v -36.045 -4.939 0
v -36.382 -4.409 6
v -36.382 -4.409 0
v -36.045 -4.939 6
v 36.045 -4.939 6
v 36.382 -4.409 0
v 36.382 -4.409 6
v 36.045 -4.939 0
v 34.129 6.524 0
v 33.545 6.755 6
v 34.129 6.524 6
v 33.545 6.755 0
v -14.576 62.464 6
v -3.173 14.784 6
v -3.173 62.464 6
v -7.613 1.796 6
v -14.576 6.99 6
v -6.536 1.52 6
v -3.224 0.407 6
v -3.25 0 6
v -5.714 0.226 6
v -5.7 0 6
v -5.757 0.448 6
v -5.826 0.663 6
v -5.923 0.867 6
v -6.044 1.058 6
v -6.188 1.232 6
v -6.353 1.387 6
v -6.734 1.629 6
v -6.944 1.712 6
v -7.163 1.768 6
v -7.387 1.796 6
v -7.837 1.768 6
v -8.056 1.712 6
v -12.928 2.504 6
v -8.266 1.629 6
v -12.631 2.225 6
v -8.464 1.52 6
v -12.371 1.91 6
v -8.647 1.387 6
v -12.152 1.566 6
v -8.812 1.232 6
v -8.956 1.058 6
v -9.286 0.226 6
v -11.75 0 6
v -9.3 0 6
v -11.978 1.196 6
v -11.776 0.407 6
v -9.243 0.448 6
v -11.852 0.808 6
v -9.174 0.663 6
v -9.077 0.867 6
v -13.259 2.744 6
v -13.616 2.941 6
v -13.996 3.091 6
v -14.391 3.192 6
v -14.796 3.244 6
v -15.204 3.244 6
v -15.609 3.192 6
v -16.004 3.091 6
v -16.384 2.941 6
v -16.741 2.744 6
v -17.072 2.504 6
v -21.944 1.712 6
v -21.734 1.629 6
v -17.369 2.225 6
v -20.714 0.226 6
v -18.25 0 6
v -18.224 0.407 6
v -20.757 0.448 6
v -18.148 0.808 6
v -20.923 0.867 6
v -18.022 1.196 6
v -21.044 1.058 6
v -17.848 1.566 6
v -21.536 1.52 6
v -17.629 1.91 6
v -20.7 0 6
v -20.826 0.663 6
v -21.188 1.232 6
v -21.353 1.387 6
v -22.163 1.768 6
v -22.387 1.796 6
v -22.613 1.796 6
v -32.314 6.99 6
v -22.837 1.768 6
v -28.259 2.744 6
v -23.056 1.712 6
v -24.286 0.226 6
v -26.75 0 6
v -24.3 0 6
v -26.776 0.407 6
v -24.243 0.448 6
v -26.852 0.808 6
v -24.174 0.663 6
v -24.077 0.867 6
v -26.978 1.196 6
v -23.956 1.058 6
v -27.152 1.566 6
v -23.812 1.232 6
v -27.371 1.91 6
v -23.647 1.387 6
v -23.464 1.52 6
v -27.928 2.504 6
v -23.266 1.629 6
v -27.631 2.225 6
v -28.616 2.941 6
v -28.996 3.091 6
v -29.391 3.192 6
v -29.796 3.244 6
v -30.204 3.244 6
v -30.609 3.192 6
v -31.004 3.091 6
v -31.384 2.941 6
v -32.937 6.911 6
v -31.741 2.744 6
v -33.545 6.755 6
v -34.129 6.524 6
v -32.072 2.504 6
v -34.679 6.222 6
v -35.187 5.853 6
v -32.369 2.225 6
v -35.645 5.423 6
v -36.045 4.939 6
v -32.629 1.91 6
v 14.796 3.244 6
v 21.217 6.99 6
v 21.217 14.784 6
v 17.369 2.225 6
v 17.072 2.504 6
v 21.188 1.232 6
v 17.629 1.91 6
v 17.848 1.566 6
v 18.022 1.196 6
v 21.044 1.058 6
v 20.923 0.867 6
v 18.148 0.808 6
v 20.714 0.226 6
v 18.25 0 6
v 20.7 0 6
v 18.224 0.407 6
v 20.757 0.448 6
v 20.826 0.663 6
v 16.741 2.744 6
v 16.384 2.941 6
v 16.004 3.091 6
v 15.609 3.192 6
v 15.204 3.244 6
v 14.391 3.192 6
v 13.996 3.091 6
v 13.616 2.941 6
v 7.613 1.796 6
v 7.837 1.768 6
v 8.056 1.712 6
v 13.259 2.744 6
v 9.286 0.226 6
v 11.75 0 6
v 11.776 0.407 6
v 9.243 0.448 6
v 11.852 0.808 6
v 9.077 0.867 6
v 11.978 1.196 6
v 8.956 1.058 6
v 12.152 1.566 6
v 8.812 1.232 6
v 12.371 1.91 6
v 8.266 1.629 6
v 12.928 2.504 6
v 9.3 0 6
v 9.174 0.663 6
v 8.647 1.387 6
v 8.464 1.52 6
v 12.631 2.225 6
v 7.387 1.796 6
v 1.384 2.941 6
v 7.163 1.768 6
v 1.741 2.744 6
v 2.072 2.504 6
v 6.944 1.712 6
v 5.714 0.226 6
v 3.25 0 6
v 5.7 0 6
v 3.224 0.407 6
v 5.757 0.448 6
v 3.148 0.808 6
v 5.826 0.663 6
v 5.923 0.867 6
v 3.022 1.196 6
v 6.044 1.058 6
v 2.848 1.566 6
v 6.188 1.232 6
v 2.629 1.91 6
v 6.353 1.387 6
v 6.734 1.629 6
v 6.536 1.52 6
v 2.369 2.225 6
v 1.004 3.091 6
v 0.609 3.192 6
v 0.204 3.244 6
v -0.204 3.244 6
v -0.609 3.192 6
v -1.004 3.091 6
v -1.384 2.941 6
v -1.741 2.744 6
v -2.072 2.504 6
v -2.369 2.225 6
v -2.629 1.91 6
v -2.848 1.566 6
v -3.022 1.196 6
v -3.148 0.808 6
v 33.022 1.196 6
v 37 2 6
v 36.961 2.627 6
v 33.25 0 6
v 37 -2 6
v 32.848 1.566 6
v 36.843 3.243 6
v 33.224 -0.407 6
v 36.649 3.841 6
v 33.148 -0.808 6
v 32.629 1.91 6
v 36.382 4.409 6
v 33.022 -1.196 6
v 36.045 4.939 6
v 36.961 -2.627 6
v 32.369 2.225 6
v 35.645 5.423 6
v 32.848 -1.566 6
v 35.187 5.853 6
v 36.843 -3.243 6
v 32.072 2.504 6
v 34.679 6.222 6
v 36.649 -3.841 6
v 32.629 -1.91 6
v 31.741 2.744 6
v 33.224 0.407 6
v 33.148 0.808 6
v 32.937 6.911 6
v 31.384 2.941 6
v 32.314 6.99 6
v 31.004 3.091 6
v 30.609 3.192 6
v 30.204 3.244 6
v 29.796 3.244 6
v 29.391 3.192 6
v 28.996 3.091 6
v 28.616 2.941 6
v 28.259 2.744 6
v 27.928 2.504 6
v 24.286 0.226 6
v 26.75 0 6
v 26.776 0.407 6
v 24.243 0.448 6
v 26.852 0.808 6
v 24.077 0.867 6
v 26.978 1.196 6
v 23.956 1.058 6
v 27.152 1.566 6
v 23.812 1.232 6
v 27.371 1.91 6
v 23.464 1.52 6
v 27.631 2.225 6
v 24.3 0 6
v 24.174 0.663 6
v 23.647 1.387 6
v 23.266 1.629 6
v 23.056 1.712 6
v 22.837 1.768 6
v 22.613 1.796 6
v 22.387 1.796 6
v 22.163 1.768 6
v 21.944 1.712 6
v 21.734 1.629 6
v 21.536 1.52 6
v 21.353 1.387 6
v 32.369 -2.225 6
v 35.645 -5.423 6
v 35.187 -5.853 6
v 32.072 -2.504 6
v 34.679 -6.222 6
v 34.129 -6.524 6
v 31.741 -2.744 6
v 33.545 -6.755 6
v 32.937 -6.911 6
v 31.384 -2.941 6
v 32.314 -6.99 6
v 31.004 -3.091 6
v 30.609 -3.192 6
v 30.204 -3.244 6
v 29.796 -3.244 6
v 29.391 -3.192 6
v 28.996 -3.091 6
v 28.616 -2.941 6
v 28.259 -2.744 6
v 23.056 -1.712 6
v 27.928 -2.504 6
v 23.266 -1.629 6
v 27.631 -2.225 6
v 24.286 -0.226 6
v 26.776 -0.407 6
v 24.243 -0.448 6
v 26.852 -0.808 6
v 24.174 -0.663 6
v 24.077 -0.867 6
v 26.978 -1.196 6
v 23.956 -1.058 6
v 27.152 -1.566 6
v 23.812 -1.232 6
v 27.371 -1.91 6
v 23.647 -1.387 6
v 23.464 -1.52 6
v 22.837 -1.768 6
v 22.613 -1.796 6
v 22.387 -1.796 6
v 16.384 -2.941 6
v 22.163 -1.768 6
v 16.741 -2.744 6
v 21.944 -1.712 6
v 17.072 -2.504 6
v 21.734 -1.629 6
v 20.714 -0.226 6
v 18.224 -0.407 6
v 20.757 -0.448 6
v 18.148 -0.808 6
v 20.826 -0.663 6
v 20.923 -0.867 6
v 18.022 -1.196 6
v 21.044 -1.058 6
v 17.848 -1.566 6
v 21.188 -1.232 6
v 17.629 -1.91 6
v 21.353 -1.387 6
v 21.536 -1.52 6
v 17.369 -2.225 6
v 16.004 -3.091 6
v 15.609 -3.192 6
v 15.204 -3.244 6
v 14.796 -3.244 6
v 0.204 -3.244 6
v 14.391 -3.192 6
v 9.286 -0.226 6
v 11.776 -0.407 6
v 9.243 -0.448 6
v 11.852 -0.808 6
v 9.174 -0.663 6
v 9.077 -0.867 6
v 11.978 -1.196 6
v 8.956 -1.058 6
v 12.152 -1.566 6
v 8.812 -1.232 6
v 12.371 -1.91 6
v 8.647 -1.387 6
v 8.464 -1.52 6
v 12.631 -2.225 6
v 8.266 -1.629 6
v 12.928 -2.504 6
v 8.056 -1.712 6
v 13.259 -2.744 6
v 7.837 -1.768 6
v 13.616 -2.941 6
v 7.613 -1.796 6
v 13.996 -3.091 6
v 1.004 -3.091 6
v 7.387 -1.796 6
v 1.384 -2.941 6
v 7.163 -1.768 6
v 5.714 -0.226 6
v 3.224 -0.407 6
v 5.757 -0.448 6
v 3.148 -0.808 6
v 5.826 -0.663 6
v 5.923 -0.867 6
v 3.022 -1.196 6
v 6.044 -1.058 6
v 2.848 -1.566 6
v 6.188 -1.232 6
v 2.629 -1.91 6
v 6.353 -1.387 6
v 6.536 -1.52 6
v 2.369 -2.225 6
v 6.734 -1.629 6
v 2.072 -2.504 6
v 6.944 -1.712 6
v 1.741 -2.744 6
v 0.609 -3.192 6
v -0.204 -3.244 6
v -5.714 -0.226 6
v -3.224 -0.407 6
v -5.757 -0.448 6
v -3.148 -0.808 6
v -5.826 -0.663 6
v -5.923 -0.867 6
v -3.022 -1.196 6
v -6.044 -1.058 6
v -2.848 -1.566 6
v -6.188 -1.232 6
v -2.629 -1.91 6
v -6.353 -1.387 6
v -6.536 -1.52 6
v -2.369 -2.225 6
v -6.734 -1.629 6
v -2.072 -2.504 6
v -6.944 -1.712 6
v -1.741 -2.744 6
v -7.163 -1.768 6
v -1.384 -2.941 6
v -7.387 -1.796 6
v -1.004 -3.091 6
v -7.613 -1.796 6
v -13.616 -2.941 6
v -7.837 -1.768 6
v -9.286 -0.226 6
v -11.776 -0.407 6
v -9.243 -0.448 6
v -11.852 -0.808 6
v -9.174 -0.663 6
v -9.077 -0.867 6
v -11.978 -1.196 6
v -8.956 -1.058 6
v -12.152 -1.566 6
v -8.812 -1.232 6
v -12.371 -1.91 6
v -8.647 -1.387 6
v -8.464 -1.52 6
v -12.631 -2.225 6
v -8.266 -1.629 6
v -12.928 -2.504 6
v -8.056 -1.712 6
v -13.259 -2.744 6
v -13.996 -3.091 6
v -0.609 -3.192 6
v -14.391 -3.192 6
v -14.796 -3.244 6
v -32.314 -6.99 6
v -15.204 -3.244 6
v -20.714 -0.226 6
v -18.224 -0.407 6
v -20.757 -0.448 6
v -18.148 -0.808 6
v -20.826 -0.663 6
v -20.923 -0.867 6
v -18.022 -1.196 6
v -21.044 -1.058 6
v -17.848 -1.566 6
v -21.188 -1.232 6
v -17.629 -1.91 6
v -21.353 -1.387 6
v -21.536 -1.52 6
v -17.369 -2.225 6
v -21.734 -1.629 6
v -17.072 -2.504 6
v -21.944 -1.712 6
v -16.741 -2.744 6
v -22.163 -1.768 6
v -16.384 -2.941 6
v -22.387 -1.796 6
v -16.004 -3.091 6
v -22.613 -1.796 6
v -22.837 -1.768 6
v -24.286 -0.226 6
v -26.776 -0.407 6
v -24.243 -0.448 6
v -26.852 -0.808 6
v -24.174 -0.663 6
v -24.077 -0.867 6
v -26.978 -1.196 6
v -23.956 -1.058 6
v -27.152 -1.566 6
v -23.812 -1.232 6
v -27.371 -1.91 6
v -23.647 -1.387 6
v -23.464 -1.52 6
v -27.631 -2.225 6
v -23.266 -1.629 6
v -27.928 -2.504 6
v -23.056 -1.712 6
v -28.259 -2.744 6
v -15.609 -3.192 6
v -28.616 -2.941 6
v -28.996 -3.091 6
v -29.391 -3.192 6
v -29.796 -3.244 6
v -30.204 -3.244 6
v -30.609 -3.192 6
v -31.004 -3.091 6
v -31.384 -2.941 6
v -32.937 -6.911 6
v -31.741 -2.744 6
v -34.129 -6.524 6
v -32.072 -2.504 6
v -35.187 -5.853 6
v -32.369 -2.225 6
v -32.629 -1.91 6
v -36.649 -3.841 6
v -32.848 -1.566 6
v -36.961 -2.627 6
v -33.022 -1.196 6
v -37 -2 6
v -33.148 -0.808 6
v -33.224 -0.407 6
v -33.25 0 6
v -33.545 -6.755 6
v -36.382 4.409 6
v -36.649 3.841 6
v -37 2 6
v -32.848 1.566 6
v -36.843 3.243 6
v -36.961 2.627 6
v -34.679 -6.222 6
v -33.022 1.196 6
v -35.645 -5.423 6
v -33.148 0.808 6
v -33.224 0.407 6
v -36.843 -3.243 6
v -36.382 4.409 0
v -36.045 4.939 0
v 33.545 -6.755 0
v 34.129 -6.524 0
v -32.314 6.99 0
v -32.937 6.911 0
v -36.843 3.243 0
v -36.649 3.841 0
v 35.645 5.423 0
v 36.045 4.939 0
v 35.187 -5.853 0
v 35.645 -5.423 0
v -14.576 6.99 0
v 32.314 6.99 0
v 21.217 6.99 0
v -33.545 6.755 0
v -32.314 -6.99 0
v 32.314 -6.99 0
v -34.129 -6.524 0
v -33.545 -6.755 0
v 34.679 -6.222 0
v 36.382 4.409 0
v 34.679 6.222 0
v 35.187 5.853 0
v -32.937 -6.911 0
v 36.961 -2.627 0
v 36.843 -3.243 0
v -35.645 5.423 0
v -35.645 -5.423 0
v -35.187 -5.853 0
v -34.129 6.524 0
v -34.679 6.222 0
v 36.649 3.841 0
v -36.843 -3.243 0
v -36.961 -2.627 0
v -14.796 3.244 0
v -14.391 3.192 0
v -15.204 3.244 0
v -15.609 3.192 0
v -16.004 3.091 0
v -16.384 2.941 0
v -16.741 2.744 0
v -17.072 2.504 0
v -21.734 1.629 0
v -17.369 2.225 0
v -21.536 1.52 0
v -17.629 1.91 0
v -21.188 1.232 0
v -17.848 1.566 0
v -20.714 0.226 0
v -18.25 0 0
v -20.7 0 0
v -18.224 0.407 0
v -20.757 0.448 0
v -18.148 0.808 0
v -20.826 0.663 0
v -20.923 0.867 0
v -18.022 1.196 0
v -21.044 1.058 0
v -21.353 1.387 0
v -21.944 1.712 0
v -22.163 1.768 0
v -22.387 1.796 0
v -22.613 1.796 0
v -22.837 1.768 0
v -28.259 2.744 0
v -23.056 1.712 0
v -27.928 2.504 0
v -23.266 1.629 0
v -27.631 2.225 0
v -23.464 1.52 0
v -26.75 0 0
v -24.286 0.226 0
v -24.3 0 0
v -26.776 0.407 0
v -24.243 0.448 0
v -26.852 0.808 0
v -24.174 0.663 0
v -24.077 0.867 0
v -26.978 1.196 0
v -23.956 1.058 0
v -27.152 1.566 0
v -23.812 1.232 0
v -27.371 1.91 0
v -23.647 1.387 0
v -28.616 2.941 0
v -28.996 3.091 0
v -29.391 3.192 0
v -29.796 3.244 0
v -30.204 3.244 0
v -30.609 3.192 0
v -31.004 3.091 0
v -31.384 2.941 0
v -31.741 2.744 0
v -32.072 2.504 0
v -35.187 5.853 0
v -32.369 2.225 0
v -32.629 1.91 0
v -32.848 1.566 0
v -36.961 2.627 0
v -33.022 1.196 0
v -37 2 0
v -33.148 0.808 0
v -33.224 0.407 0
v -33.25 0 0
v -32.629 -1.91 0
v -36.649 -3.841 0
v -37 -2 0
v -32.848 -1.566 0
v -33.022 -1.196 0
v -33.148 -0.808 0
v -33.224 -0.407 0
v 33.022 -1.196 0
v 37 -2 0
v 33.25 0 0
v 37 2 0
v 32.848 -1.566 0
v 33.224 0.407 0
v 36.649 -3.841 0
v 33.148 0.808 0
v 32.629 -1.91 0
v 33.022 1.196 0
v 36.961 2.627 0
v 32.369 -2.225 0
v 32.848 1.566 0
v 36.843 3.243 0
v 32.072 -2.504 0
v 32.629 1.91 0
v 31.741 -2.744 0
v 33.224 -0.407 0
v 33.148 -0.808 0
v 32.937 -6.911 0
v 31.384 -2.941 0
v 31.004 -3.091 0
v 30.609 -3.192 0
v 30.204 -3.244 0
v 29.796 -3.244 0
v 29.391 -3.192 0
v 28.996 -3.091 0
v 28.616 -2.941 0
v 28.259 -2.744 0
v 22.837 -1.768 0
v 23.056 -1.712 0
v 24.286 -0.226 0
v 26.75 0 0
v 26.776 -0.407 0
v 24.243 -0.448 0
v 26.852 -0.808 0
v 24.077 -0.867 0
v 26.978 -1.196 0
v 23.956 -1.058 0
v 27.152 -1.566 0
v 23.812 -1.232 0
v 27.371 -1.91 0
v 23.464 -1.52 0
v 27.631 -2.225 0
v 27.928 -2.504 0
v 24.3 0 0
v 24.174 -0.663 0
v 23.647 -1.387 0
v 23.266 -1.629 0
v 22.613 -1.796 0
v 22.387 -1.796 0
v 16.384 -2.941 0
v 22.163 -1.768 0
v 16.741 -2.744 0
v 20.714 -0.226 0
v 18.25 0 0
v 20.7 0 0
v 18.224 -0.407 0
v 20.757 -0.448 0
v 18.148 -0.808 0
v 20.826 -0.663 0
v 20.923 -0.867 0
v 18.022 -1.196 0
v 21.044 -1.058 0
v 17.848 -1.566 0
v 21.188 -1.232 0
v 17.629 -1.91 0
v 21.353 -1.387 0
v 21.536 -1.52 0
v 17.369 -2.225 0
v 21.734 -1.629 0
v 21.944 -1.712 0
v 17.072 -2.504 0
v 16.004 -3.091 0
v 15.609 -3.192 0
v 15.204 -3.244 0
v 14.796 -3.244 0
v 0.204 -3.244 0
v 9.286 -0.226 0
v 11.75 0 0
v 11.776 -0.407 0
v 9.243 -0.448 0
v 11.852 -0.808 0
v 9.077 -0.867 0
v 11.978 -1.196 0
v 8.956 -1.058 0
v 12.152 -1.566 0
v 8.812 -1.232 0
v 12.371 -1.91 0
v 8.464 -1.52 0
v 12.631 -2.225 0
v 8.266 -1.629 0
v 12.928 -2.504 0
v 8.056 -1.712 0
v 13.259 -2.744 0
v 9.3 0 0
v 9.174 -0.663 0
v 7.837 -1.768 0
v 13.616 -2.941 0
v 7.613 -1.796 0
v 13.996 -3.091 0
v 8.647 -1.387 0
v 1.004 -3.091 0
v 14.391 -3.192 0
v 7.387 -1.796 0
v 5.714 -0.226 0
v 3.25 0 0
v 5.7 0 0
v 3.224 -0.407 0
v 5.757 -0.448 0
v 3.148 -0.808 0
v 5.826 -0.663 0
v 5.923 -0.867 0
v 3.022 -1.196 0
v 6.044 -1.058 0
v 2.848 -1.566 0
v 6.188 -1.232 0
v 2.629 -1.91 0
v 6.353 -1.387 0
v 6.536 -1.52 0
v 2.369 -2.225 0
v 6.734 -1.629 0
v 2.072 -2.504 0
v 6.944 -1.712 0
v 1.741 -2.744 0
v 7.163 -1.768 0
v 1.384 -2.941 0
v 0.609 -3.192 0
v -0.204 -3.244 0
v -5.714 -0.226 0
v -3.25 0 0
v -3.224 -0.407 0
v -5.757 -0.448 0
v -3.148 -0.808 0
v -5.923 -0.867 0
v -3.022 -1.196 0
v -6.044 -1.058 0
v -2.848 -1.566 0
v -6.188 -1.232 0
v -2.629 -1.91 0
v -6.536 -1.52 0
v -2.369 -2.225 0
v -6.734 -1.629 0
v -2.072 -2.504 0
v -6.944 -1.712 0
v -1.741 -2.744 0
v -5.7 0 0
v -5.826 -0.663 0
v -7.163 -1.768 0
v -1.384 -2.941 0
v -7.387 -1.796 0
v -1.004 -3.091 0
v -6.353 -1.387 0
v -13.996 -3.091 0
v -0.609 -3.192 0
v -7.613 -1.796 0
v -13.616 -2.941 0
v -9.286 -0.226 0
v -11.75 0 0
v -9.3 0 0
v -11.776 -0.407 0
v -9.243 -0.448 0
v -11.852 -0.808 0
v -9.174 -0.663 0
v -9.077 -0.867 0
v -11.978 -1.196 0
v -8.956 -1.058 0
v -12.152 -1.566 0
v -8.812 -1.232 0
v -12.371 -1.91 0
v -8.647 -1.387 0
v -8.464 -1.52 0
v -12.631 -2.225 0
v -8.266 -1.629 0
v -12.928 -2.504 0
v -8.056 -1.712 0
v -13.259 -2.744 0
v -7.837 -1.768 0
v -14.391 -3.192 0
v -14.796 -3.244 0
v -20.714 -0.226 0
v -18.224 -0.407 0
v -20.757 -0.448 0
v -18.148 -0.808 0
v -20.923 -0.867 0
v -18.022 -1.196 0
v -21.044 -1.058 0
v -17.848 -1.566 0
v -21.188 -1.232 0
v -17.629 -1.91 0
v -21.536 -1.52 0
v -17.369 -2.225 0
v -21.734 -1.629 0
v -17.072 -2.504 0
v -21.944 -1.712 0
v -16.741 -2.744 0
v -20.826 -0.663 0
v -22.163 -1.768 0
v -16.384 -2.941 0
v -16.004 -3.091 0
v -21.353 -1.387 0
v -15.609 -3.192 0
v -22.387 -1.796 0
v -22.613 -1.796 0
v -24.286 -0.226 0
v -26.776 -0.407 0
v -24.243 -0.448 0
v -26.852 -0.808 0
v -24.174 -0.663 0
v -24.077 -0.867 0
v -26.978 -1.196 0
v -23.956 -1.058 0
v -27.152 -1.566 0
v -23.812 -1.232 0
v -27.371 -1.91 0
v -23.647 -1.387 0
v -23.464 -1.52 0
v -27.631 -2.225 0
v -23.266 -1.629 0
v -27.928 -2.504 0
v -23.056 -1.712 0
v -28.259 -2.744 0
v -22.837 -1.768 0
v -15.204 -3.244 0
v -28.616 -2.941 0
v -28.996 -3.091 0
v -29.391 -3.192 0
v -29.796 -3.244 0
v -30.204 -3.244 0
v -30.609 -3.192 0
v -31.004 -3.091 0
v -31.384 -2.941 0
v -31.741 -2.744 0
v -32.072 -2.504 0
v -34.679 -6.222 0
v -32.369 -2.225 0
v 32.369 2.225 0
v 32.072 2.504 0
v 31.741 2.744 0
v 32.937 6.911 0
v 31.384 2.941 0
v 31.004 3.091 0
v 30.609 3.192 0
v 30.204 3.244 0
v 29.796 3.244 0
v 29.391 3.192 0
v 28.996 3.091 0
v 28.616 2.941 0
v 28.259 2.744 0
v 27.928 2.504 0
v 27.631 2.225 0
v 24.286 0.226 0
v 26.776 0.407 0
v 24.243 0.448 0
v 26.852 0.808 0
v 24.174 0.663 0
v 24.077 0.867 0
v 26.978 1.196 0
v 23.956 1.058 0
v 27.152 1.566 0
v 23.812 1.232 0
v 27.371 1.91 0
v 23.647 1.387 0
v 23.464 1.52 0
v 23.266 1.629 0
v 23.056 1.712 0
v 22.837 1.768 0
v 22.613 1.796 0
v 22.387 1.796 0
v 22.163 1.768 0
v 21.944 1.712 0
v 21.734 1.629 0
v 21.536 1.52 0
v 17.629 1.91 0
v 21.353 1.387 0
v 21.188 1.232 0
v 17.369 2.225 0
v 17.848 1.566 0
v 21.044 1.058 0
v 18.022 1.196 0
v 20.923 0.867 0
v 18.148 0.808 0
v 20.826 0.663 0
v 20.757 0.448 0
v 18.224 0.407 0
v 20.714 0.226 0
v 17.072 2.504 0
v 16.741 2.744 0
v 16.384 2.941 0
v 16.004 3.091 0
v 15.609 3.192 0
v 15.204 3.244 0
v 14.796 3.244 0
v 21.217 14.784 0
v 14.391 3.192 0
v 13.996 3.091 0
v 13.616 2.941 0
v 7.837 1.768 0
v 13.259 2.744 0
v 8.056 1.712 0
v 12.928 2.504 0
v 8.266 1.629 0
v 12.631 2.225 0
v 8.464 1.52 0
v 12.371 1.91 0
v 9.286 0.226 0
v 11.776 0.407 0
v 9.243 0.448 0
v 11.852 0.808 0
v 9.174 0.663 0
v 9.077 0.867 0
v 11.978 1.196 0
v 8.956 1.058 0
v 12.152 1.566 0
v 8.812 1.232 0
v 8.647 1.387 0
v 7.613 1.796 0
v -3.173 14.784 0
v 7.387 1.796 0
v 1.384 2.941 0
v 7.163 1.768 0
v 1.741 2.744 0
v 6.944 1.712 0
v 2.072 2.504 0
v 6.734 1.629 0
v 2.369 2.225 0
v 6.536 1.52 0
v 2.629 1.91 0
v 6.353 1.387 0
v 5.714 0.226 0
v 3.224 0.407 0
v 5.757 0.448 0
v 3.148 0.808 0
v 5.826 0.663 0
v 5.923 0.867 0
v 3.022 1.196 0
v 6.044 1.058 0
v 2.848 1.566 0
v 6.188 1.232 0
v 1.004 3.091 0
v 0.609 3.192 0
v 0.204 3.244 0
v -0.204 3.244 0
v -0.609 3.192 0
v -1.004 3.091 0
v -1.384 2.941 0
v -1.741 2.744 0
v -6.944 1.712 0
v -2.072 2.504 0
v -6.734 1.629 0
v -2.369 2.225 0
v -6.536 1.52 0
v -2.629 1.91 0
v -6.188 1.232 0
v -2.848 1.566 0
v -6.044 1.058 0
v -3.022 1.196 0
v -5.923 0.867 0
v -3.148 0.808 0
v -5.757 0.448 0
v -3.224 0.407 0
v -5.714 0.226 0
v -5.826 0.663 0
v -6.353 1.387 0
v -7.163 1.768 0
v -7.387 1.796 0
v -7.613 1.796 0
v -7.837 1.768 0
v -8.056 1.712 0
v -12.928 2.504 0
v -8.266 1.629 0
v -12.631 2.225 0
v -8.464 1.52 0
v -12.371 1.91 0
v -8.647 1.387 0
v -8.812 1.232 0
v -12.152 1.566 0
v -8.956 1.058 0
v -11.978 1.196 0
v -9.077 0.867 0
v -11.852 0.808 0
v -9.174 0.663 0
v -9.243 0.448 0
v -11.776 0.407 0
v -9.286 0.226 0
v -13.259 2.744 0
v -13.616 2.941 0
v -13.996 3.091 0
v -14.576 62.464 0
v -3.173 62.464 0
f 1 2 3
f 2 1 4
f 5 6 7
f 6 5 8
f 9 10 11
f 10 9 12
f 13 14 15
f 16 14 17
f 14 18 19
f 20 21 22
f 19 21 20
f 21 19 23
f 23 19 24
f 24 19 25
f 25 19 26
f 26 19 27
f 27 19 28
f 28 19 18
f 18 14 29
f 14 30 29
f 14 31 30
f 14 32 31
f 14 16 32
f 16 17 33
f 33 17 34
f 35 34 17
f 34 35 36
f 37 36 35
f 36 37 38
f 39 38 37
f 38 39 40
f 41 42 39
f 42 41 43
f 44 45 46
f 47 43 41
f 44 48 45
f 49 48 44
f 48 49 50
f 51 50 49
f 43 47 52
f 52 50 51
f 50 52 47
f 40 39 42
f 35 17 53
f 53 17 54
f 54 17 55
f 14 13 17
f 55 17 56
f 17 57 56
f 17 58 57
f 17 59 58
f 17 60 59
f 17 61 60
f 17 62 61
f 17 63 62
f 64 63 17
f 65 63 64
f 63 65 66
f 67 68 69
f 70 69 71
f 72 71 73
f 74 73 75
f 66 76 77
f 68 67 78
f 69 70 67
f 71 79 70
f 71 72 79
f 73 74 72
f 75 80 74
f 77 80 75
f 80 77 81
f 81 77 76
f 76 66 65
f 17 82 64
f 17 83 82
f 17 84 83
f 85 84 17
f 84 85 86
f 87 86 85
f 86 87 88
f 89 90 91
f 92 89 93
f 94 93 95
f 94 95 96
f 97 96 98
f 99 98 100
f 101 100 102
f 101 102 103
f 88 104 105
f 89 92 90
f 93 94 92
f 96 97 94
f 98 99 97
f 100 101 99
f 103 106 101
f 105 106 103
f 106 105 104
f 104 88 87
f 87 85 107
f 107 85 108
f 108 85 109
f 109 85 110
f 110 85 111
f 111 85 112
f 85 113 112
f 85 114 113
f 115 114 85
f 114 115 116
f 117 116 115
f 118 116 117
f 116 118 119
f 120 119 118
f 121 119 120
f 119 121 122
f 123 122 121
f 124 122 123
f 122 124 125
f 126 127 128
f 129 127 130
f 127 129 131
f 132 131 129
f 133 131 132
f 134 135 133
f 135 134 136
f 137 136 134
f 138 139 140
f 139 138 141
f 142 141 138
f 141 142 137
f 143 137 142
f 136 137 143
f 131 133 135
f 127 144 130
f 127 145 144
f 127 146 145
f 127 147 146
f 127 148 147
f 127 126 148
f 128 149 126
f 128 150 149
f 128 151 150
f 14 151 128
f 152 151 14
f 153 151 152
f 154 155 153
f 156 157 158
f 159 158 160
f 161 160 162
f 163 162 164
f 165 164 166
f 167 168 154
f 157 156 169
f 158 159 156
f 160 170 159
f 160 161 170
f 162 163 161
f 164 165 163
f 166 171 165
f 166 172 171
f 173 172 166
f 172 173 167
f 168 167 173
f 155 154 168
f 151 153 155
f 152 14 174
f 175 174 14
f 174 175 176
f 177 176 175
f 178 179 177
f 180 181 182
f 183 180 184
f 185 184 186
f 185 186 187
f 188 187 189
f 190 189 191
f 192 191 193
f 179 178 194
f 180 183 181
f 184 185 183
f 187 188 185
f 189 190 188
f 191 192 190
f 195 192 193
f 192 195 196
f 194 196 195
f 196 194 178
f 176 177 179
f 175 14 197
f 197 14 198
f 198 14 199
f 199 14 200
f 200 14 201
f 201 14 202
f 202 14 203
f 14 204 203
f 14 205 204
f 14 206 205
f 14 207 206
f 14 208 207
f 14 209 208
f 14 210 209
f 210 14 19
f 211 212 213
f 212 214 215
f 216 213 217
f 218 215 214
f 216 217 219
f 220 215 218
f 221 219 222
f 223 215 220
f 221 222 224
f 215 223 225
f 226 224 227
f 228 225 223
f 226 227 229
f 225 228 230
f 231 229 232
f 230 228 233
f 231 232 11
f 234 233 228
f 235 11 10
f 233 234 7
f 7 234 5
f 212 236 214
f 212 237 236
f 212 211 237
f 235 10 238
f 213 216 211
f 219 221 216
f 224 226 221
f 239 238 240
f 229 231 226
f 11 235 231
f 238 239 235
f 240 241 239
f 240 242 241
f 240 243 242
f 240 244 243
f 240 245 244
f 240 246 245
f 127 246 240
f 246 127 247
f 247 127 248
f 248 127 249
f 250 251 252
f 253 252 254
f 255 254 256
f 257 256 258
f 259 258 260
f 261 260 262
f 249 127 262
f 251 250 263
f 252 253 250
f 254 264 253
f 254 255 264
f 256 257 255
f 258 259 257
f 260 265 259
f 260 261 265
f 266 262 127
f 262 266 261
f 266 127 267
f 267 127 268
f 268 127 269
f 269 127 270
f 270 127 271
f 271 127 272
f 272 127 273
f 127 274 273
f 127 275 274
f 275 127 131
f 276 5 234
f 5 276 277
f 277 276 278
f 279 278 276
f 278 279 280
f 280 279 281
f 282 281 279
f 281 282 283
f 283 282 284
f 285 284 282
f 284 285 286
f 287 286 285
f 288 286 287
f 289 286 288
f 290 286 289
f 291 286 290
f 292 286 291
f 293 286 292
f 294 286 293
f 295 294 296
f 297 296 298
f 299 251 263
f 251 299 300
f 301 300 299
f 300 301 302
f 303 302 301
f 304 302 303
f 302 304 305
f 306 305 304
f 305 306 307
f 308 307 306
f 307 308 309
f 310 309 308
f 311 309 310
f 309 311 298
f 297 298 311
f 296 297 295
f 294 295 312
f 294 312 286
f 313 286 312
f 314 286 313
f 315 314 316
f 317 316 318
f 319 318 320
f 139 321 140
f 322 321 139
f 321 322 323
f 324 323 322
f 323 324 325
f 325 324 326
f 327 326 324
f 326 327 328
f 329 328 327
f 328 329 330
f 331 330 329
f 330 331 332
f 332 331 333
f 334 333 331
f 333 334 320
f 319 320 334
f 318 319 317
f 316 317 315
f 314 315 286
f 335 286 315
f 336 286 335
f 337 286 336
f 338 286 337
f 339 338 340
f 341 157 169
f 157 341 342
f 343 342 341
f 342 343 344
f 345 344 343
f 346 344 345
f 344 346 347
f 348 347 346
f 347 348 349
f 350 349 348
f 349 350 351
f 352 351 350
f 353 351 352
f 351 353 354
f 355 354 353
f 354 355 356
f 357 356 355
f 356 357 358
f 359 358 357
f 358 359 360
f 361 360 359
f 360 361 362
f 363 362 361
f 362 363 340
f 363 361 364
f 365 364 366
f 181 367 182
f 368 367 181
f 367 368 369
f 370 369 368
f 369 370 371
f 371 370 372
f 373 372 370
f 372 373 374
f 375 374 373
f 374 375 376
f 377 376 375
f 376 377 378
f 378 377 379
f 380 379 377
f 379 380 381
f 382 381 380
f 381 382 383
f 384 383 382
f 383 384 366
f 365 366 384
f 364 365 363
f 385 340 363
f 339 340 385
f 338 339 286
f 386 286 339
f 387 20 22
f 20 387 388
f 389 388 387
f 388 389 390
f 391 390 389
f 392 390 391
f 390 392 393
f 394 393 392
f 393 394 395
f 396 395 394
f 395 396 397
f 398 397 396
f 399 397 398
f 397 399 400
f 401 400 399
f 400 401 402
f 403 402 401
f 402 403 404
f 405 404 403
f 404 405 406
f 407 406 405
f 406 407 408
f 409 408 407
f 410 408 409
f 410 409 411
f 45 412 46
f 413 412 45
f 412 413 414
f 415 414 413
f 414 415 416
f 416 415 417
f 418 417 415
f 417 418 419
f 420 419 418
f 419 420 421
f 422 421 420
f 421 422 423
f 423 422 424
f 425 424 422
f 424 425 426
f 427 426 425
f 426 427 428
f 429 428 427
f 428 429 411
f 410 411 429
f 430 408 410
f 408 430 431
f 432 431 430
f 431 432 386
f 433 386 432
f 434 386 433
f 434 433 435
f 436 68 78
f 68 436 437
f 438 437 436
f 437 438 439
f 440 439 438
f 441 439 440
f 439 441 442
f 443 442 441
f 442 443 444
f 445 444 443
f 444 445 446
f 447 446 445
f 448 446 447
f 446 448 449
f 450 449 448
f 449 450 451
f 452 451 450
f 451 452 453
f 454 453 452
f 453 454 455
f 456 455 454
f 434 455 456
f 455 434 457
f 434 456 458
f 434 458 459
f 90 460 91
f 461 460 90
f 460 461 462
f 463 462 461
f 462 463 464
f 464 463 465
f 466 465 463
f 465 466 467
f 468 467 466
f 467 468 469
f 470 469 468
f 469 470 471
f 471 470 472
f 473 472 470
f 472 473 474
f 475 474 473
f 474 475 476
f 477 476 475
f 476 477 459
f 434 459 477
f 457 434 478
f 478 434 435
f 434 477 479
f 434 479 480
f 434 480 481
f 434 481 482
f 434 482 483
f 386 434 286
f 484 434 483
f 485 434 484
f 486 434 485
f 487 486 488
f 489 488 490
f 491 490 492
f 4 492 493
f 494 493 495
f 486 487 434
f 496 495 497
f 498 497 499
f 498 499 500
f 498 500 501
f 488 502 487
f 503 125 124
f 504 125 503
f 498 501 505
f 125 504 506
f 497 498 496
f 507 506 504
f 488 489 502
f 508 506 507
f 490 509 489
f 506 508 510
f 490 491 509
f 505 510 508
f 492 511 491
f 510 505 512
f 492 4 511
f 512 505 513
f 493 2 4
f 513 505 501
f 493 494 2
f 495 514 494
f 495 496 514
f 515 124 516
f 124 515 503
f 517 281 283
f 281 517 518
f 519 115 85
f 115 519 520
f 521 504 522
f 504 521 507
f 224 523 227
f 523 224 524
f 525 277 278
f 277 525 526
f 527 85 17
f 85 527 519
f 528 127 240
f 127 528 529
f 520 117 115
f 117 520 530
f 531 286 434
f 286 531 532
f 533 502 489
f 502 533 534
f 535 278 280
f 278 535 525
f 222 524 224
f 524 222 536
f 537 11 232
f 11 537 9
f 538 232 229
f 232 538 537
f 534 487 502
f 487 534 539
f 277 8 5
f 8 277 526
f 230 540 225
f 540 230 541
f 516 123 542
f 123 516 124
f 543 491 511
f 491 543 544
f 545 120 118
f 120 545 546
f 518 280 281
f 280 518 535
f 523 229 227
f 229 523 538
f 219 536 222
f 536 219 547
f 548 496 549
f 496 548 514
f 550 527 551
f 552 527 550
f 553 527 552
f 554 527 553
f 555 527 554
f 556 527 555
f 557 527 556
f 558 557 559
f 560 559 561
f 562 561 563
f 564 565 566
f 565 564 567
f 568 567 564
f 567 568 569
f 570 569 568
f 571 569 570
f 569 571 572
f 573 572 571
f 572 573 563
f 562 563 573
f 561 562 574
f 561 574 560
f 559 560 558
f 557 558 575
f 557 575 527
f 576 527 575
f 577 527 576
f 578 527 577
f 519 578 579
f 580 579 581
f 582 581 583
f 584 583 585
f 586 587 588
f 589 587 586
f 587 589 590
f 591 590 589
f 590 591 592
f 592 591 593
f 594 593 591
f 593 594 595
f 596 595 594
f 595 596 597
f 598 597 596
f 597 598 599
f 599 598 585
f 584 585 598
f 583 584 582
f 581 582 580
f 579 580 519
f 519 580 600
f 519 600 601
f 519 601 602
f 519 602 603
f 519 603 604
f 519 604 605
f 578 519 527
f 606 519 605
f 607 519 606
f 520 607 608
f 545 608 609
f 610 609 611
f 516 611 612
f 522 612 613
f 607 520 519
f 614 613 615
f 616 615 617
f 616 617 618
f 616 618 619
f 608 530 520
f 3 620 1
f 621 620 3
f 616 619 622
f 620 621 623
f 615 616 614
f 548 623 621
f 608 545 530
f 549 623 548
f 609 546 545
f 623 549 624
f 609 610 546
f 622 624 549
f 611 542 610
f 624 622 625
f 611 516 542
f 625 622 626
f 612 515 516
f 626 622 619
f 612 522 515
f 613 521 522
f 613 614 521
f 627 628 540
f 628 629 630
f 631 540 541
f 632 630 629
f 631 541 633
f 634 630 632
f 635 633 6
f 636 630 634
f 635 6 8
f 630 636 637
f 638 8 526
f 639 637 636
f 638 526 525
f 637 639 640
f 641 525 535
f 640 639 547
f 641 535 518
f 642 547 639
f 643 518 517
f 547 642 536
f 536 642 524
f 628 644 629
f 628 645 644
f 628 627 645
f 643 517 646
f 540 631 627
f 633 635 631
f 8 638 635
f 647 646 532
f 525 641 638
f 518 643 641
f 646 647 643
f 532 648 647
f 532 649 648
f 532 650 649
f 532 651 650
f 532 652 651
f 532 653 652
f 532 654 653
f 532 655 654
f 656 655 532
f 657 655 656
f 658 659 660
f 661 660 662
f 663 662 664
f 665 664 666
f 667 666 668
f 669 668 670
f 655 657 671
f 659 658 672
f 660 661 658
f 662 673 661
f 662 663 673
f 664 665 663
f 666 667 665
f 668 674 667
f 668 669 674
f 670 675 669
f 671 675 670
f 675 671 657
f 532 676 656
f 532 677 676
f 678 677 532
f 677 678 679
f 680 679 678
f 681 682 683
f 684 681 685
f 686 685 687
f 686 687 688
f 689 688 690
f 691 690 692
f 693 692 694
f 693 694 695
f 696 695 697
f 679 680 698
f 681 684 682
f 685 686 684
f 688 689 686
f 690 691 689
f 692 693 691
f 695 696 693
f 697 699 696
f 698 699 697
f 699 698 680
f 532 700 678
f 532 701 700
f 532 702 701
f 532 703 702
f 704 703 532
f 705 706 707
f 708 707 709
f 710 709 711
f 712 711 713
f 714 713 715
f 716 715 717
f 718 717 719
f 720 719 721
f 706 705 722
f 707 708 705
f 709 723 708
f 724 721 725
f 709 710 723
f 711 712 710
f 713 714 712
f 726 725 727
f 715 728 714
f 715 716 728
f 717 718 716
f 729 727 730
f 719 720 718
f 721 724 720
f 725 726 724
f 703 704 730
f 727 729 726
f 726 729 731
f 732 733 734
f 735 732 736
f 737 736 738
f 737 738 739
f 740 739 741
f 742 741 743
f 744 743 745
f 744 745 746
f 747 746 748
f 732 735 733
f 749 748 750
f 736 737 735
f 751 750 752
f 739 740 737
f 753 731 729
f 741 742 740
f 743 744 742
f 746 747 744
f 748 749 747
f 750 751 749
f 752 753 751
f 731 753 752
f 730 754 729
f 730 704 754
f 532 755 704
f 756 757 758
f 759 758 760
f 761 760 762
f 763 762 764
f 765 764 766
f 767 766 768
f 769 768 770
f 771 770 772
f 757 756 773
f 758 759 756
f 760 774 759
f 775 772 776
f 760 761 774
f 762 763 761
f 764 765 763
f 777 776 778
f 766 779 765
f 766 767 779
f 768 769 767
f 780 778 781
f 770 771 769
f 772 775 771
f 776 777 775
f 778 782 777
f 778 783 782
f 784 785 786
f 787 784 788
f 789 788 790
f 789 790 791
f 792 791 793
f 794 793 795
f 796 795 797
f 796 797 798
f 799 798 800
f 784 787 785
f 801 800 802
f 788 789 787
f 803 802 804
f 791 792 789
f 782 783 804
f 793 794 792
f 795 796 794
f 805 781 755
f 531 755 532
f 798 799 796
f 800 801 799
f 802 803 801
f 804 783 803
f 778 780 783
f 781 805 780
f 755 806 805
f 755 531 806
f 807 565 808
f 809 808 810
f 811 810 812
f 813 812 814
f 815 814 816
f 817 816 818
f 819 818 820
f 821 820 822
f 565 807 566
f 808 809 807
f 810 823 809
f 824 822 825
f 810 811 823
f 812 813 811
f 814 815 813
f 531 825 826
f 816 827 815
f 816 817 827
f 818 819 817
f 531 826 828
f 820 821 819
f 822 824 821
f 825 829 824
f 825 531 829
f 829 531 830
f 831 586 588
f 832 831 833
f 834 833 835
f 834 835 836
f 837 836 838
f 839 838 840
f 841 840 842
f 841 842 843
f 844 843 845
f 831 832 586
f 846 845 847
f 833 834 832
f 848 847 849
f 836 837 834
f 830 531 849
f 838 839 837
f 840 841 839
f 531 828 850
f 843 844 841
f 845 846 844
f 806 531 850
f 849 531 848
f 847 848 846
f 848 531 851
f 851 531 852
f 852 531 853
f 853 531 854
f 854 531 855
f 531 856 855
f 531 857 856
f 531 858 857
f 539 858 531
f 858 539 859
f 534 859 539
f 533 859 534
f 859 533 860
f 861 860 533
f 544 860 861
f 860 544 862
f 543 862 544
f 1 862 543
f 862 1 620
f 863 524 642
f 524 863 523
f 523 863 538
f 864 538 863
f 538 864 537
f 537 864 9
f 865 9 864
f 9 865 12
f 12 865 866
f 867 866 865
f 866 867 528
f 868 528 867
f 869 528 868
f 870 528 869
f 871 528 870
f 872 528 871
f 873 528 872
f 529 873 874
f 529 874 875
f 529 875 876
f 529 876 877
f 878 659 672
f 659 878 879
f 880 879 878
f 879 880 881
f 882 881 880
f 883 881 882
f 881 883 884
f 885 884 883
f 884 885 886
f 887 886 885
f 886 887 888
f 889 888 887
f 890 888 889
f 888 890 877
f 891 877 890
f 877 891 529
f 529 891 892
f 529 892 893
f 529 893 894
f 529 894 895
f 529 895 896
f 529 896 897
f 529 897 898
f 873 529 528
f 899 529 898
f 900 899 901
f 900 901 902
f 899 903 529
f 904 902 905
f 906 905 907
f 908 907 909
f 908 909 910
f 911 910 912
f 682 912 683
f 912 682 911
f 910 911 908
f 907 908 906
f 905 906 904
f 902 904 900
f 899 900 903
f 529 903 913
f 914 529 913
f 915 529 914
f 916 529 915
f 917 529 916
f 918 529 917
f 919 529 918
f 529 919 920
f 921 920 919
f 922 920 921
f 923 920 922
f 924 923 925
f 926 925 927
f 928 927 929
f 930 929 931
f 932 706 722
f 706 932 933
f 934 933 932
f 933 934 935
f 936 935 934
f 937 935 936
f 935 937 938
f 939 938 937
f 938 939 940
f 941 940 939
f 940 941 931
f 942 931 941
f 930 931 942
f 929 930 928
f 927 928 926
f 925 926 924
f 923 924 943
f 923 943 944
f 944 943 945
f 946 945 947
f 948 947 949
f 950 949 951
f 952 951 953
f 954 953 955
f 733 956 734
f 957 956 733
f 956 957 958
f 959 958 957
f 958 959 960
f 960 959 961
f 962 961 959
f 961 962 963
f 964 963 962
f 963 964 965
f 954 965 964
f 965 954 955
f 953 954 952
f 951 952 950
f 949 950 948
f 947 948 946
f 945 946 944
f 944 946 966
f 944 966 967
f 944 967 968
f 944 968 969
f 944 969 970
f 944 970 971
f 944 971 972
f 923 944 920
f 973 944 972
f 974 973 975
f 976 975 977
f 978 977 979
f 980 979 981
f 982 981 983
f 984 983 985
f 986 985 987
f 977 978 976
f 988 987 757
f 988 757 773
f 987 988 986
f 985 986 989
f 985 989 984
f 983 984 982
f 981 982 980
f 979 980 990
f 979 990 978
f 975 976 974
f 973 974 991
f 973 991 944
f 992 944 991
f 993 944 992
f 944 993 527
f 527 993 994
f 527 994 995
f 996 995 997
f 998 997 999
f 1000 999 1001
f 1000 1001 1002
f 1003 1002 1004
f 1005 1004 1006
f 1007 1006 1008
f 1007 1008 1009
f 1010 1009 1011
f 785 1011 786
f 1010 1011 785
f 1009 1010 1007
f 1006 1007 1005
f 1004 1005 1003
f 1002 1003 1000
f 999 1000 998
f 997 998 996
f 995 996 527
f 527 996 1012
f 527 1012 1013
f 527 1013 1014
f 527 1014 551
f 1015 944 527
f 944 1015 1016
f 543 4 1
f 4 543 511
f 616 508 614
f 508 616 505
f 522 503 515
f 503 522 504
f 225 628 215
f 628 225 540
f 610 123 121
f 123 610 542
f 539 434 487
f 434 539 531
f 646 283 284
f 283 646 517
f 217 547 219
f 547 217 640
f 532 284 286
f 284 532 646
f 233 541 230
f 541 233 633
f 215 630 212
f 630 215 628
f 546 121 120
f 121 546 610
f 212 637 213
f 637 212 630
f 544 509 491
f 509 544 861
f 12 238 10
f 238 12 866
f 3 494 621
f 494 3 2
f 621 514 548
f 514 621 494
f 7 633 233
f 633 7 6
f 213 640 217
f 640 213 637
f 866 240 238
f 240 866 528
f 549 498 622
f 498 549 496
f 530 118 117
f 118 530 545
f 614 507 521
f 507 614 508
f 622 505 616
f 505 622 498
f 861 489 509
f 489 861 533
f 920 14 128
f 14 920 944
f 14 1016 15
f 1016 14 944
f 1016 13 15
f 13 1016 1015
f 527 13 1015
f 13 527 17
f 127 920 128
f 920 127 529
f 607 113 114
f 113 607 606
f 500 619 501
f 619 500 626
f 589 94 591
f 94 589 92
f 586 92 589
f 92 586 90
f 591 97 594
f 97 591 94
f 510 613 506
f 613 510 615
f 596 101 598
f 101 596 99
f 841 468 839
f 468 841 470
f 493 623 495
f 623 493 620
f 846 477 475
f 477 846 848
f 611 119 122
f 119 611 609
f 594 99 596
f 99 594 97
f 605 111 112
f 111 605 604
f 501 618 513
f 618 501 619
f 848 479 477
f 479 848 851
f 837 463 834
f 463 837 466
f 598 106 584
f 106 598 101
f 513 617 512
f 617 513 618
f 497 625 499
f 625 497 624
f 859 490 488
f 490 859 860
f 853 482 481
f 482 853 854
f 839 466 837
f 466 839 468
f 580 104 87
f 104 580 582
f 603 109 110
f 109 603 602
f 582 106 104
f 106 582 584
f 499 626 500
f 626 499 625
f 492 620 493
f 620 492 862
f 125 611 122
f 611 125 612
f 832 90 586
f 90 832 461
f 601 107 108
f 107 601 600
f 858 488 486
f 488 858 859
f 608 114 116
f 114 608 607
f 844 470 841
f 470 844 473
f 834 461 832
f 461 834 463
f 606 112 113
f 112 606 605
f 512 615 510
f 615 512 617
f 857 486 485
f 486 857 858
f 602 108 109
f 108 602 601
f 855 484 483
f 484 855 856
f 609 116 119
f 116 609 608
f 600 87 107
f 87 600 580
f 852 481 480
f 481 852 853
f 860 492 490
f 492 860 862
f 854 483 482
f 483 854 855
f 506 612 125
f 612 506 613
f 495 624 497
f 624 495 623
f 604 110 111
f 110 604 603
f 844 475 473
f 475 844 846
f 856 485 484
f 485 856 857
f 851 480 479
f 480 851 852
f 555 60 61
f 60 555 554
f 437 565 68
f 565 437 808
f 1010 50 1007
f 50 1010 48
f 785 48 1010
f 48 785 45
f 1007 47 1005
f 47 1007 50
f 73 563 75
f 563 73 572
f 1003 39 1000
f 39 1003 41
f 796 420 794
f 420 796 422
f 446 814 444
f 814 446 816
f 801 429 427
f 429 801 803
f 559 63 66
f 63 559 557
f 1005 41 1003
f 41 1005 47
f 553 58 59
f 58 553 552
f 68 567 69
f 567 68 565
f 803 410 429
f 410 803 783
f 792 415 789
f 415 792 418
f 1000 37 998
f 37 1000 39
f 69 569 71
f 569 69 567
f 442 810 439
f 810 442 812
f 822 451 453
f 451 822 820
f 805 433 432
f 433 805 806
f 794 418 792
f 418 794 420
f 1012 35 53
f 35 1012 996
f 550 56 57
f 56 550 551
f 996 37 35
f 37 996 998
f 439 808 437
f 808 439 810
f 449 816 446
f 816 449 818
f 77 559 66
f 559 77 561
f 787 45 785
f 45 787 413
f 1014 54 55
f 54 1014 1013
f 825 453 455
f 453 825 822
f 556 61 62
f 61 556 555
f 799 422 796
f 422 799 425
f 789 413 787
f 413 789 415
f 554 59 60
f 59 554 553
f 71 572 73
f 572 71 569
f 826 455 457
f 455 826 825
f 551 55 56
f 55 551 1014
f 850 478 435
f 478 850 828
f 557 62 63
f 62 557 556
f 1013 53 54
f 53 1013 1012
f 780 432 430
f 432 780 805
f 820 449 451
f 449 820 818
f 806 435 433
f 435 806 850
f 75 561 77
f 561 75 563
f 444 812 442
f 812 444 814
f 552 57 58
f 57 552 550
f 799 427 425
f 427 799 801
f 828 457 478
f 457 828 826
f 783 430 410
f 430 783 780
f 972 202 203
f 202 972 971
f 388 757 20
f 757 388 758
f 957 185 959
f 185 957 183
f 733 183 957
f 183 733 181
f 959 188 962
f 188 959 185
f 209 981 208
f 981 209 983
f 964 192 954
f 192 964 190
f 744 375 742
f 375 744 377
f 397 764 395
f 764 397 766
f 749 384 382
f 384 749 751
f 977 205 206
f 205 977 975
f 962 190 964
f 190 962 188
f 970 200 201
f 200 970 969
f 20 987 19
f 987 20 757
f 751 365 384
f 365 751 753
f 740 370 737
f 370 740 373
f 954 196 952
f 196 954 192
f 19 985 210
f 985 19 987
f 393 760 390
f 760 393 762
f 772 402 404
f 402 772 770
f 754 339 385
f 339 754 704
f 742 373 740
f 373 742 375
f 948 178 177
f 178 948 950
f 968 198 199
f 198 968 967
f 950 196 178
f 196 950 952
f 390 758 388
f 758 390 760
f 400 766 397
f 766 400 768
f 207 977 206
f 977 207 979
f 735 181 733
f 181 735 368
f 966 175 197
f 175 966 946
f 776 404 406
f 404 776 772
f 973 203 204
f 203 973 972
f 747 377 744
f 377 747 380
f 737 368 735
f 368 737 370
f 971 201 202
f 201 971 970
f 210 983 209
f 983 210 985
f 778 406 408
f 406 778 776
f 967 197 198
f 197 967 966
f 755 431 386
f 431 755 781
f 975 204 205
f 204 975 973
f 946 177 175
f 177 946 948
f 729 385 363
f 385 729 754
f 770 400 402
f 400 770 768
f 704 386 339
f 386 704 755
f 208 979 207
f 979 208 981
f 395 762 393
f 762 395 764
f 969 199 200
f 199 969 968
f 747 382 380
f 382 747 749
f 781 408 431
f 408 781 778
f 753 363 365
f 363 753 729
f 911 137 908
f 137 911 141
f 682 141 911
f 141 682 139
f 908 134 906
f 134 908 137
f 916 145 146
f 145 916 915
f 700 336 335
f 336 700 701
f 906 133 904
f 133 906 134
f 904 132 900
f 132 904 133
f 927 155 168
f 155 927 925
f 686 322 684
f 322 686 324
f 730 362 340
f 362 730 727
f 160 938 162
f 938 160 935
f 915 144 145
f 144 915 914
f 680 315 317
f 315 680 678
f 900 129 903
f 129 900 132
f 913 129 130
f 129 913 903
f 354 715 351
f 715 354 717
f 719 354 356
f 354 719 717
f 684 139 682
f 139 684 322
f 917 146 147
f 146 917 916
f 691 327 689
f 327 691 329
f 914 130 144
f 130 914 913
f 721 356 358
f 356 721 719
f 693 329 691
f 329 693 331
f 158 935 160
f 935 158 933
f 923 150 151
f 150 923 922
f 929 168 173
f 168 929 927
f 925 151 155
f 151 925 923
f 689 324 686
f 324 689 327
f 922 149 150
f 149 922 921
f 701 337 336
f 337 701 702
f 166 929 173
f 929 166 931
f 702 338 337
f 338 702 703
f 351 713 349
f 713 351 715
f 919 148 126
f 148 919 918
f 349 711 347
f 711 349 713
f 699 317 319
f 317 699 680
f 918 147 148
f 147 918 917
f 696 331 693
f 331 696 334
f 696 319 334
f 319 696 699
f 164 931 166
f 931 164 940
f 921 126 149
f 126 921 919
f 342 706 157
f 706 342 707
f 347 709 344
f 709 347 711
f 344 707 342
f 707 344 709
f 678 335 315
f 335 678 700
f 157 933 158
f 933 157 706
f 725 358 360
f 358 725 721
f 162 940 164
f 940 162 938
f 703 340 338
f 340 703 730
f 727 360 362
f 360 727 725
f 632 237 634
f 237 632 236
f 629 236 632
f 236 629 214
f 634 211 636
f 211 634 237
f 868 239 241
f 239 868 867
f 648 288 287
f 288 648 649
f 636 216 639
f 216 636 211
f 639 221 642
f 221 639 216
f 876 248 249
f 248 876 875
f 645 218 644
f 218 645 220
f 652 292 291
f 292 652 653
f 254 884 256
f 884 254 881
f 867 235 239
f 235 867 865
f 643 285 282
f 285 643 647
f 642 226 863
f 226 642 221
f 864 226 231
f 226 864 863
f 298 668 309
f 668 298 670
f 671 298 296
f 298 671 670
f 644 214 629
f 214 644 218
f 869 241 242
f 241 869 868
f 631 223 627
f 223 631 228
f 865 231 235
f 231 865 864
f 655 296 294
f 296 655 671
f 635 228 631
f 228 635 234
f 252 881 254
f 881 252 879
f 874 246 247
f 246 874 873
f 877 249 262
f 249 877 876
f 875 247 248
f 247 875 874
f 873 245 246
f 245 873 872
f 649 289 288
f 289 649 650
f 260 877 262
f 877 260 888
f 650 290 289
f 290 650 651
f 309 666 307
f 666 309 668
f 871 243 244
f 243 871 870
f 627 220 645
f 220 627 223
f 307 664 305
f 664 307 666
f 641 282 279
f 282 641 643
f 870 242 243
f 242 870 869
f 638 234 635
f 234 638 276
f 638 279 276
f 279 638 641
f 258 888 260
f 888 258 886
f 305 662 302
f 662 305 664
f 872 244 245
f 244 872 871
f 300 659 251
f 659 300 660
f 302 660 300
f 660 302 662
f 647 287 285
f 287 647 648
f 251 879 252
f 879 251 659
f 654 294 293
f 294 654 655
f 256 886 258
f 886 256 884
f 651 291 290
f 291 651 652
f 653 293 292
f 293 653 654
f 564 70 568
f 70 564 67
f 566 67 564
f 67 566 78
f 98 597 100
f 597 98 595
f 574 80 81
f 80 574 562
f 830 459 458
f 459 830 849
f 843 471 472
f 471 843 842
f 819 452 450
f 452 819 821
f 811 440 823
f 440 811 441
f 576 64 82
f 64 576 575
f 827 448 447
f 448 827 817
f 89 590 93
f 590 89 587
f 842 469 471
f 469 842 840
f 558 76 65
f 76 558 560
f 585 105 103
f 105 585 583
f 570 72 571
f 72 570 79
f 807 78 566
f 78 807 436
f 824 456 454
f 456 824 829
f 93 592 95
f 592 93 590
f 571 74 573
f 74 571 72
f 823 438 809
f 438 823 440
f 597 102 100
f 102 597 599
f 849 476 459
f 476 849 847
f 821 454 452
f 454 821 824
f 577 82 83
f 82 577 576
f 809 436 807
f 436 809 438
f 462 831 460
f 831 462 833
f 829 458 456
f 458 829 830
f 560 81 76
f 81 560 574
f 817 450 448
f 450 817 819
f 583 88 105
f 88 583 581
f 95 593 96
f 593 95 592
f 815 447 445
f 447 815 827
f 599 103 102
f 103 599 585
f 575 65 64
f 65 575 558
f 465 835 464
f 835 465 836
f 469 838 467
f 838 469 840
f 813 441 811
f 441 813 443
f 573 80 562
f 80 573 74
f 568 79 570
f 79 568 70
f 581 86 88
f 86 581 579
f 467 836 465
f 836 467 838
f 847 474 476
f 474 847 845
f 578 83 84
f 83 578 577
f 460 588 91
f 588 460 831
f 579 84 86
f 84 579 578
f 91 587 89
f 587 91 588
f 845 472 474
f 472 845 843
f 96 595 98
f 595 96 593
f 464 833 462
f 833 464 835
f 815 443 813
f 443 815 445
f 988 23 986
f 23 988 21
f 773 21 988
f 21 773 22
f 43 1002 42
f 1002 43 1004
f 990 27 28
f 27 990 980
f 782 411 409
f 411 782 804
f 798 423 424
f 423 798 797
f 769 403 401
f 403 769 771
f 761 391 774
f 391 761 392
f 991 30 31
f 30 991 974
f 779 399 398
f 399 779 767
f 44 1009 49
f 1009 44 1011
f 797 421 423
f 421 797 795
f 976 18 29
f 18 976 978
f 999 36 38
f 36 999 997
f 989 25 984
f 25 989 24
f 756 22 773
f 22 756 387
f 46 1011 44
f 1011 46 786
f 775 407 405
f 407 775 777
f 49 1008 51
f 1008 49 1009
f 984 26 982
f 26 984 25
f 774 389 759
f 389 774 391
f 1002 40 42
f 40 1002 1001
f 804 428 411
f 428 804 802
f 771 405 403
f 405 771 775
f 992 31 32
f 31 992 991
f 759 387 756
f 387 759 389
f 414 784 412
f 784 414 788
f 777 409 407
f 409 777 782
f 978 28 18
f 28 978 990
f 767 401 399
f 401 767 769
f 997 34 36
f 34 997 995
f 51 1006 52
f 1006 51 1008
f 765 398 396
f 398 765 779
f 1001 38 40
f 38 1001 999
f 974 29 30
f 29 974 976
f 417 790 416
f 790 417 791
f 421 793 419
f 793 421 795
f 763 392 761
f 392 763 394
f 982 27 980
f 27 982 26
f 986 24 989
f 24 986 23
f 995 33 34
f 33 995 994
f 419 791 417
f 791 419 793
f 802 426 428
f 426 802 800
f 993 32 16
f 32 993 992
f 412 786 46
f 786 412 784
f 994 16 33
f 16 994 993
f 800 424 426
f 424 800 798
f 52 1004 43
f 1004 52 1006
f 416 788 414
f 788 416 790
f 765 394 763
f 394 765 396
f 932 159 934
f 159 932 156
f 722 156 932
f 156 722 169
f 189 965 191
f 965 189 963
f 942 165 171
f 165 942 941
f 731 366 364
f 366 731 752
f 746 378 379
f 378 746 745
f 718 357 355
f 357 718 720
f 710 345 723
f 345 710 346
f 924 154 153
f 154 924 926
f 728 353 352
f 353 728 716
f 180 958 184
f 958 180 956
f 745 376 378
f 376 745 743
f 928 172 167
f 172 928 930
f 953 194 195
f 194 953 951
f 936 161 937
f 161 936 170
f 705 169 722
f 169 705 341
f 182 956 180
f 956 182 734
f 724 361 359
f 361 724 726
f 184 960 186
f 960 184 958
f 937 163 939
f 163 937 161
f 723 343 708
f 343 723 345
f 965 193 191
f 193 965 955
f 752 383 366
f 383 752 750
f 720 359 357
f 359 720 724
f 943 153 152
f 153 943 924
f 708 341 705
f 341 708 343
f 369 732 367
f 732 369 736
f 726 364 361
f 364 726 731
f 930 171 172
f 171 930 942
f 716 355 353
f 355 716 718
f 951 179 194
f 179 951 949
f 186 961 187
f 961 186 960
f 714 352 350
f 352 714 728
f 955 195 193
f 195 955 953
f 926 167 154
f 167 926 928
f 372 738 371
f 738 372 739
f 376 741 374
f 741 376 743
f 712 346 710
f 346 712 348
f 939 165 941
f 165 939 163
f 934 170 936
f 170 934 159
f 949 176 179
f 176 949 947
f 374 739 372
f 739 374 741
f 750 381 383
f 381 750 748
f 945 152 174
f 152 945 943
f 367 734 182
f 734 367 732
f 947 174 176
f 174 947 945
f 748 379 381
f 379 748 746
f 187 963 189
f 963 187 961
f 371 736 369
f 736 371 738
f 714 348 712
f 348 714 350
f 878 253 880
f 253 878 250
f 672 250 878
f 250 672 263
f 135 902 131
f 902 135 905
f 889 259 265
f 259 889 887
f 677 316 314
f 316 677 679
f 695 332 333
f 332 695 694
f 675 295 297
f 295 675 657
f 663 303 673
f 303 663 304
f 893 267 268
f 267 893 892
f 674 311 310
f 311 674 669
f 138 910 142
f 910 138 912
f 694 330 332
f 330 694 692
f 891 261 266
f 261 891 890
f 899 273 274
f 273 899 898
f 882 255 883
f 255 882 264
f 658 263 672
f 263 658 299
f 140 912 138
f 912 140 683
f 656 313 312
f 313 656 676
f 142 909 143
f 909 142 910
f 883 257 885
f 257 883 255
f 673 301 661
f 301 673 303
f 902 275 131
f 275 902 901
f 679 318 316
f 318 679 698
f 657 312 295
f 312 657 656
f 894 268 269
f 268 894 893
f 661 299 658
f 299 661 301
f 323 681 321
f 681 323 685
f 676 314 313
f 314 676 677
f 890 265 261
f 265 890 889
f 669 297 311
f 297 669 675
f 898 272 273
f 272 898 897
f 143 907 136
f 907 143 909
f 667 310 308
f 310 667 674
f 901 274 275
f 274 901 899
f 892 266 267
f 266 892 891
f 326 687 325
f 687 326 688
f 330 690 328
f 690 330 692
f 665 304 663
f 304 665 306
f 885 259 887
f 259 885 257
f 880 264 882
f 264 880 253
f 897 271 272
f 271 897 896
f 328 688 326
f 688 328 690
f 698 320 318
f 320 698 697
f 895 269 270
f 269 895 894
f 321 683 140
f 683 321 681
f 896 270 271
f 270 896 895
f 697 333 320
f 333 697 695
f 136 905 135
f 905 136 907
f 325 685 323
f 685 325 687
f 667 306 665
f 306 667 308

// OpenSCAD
$fn = 50;


difference() {
	union() {
		hull() {
			translate(v = [-32.0000000000, 2.0000000000, 0]) {
				cylinder(h = 6, r = 5);
			}
			translate(v = [32.0000000000, 2.0000000000, 0]) {
				cylinder(h = 6, r = 5);
			}
			translate(v = [-32.0000000000, -2.0000000000, 0]) {
				cylinder(h = 6, r = 5);
			}
			translate(v = [32.0000000000, -2.0000000000, 0]) {
				cylinder(h = 6, r = 5);
			}
		}
		translate(v = [0, 61.1111111111, 0]) {
			linear_extrude(height = 6) {
				text(font = "DejaVu Sans Mono:style=Bold", halign = "center", size = 57.0000000000, text = "L", valign = "top");
			}
		}
	}
	union() {
		translate(v = [-30.0000000000, 0.0000000000, 0]) {
			translate(v = [0, 0, -100]) {
				cylinder(h = 200, r = 3.2500000000);
			}
		}
		translate(v = [-15.0000000000, 0.0000000000, 0]) {
			translate(v = [0, 0, -100]) {
				cylinder(h = 200, r = 3.2500000000);
			}
		}
		translate(v = [0, 0, -100]) {
			cylinder(h = 200, r = 3.2500000000);
		}
		translate(v = [15.0000000000, 0.0000000000, 0]) {
			translate(v = [0, 0, -100]) {
				cylinder(h = 200, r = 3.2500000000);
			}
		}
		translate(v = [30.0000000000, 0.0000000000, 0]) {
			translate(v = [0, 0, -100]) {
				cylinder(h = 200, r = 3.2500000000);
			}
		}
		translate(v = [-30.0000000000, 0.0000000000, 0]) {
			translate(v = [0, 0, -100]) {
				cylinder(h = 200, r = 1.8000000000);
			}
		}
		translate(v = [-22.5000000000, 0.0000000000, 0]) {
			translate(v = [0, 0, -100]) {
				cylinder(h = 200, r = 1.8000000000);
			}
		}
		translate(v = [-15.0000000000, 0.0000000000, 0]) {
			translate(v = [0, 0, -100]) {
				cylinder(h = 200, r = 1.8000000000);
			}
		}
		translate(v = [-7.5000000000, 0.0000000000, 0]) {
			translate(v = [0, 0, -100]) {
				cylinder(h = 200, r = 1.8000000000);
			}
		}
		translate(v = [0, 0, -100]) {
			cylinder(h = 200, r = 1.8000000000);
		}
		translate(v = [7.5000000000, 0.0000000000, 0]) {
			translate(v = [0, 0, -100]) {
				cylinder(h = 200, r = 1.8000000000);
			}
		}
		translate(v = [15.0000000000, 0.0000000000, 0]) {
			translate(v = [0, 0, -100]) {
				cylinder(h = 200, r = 1.8000000000);
			}
		}
		translate(v = [22.5000000000, 0.0000000000, 0]) {
			translate(v = [0, 0, -100]) {
				cylinder(h = 200, r = 1.8000000000);
			}
		}
		translate(v = [30.0000000000, 0.0000000000, 0]) {
			translate(v = [0, 0, -100]) {
				cylinder(h = 200, r = 1.8000000000);
			}
		}
	}
}
